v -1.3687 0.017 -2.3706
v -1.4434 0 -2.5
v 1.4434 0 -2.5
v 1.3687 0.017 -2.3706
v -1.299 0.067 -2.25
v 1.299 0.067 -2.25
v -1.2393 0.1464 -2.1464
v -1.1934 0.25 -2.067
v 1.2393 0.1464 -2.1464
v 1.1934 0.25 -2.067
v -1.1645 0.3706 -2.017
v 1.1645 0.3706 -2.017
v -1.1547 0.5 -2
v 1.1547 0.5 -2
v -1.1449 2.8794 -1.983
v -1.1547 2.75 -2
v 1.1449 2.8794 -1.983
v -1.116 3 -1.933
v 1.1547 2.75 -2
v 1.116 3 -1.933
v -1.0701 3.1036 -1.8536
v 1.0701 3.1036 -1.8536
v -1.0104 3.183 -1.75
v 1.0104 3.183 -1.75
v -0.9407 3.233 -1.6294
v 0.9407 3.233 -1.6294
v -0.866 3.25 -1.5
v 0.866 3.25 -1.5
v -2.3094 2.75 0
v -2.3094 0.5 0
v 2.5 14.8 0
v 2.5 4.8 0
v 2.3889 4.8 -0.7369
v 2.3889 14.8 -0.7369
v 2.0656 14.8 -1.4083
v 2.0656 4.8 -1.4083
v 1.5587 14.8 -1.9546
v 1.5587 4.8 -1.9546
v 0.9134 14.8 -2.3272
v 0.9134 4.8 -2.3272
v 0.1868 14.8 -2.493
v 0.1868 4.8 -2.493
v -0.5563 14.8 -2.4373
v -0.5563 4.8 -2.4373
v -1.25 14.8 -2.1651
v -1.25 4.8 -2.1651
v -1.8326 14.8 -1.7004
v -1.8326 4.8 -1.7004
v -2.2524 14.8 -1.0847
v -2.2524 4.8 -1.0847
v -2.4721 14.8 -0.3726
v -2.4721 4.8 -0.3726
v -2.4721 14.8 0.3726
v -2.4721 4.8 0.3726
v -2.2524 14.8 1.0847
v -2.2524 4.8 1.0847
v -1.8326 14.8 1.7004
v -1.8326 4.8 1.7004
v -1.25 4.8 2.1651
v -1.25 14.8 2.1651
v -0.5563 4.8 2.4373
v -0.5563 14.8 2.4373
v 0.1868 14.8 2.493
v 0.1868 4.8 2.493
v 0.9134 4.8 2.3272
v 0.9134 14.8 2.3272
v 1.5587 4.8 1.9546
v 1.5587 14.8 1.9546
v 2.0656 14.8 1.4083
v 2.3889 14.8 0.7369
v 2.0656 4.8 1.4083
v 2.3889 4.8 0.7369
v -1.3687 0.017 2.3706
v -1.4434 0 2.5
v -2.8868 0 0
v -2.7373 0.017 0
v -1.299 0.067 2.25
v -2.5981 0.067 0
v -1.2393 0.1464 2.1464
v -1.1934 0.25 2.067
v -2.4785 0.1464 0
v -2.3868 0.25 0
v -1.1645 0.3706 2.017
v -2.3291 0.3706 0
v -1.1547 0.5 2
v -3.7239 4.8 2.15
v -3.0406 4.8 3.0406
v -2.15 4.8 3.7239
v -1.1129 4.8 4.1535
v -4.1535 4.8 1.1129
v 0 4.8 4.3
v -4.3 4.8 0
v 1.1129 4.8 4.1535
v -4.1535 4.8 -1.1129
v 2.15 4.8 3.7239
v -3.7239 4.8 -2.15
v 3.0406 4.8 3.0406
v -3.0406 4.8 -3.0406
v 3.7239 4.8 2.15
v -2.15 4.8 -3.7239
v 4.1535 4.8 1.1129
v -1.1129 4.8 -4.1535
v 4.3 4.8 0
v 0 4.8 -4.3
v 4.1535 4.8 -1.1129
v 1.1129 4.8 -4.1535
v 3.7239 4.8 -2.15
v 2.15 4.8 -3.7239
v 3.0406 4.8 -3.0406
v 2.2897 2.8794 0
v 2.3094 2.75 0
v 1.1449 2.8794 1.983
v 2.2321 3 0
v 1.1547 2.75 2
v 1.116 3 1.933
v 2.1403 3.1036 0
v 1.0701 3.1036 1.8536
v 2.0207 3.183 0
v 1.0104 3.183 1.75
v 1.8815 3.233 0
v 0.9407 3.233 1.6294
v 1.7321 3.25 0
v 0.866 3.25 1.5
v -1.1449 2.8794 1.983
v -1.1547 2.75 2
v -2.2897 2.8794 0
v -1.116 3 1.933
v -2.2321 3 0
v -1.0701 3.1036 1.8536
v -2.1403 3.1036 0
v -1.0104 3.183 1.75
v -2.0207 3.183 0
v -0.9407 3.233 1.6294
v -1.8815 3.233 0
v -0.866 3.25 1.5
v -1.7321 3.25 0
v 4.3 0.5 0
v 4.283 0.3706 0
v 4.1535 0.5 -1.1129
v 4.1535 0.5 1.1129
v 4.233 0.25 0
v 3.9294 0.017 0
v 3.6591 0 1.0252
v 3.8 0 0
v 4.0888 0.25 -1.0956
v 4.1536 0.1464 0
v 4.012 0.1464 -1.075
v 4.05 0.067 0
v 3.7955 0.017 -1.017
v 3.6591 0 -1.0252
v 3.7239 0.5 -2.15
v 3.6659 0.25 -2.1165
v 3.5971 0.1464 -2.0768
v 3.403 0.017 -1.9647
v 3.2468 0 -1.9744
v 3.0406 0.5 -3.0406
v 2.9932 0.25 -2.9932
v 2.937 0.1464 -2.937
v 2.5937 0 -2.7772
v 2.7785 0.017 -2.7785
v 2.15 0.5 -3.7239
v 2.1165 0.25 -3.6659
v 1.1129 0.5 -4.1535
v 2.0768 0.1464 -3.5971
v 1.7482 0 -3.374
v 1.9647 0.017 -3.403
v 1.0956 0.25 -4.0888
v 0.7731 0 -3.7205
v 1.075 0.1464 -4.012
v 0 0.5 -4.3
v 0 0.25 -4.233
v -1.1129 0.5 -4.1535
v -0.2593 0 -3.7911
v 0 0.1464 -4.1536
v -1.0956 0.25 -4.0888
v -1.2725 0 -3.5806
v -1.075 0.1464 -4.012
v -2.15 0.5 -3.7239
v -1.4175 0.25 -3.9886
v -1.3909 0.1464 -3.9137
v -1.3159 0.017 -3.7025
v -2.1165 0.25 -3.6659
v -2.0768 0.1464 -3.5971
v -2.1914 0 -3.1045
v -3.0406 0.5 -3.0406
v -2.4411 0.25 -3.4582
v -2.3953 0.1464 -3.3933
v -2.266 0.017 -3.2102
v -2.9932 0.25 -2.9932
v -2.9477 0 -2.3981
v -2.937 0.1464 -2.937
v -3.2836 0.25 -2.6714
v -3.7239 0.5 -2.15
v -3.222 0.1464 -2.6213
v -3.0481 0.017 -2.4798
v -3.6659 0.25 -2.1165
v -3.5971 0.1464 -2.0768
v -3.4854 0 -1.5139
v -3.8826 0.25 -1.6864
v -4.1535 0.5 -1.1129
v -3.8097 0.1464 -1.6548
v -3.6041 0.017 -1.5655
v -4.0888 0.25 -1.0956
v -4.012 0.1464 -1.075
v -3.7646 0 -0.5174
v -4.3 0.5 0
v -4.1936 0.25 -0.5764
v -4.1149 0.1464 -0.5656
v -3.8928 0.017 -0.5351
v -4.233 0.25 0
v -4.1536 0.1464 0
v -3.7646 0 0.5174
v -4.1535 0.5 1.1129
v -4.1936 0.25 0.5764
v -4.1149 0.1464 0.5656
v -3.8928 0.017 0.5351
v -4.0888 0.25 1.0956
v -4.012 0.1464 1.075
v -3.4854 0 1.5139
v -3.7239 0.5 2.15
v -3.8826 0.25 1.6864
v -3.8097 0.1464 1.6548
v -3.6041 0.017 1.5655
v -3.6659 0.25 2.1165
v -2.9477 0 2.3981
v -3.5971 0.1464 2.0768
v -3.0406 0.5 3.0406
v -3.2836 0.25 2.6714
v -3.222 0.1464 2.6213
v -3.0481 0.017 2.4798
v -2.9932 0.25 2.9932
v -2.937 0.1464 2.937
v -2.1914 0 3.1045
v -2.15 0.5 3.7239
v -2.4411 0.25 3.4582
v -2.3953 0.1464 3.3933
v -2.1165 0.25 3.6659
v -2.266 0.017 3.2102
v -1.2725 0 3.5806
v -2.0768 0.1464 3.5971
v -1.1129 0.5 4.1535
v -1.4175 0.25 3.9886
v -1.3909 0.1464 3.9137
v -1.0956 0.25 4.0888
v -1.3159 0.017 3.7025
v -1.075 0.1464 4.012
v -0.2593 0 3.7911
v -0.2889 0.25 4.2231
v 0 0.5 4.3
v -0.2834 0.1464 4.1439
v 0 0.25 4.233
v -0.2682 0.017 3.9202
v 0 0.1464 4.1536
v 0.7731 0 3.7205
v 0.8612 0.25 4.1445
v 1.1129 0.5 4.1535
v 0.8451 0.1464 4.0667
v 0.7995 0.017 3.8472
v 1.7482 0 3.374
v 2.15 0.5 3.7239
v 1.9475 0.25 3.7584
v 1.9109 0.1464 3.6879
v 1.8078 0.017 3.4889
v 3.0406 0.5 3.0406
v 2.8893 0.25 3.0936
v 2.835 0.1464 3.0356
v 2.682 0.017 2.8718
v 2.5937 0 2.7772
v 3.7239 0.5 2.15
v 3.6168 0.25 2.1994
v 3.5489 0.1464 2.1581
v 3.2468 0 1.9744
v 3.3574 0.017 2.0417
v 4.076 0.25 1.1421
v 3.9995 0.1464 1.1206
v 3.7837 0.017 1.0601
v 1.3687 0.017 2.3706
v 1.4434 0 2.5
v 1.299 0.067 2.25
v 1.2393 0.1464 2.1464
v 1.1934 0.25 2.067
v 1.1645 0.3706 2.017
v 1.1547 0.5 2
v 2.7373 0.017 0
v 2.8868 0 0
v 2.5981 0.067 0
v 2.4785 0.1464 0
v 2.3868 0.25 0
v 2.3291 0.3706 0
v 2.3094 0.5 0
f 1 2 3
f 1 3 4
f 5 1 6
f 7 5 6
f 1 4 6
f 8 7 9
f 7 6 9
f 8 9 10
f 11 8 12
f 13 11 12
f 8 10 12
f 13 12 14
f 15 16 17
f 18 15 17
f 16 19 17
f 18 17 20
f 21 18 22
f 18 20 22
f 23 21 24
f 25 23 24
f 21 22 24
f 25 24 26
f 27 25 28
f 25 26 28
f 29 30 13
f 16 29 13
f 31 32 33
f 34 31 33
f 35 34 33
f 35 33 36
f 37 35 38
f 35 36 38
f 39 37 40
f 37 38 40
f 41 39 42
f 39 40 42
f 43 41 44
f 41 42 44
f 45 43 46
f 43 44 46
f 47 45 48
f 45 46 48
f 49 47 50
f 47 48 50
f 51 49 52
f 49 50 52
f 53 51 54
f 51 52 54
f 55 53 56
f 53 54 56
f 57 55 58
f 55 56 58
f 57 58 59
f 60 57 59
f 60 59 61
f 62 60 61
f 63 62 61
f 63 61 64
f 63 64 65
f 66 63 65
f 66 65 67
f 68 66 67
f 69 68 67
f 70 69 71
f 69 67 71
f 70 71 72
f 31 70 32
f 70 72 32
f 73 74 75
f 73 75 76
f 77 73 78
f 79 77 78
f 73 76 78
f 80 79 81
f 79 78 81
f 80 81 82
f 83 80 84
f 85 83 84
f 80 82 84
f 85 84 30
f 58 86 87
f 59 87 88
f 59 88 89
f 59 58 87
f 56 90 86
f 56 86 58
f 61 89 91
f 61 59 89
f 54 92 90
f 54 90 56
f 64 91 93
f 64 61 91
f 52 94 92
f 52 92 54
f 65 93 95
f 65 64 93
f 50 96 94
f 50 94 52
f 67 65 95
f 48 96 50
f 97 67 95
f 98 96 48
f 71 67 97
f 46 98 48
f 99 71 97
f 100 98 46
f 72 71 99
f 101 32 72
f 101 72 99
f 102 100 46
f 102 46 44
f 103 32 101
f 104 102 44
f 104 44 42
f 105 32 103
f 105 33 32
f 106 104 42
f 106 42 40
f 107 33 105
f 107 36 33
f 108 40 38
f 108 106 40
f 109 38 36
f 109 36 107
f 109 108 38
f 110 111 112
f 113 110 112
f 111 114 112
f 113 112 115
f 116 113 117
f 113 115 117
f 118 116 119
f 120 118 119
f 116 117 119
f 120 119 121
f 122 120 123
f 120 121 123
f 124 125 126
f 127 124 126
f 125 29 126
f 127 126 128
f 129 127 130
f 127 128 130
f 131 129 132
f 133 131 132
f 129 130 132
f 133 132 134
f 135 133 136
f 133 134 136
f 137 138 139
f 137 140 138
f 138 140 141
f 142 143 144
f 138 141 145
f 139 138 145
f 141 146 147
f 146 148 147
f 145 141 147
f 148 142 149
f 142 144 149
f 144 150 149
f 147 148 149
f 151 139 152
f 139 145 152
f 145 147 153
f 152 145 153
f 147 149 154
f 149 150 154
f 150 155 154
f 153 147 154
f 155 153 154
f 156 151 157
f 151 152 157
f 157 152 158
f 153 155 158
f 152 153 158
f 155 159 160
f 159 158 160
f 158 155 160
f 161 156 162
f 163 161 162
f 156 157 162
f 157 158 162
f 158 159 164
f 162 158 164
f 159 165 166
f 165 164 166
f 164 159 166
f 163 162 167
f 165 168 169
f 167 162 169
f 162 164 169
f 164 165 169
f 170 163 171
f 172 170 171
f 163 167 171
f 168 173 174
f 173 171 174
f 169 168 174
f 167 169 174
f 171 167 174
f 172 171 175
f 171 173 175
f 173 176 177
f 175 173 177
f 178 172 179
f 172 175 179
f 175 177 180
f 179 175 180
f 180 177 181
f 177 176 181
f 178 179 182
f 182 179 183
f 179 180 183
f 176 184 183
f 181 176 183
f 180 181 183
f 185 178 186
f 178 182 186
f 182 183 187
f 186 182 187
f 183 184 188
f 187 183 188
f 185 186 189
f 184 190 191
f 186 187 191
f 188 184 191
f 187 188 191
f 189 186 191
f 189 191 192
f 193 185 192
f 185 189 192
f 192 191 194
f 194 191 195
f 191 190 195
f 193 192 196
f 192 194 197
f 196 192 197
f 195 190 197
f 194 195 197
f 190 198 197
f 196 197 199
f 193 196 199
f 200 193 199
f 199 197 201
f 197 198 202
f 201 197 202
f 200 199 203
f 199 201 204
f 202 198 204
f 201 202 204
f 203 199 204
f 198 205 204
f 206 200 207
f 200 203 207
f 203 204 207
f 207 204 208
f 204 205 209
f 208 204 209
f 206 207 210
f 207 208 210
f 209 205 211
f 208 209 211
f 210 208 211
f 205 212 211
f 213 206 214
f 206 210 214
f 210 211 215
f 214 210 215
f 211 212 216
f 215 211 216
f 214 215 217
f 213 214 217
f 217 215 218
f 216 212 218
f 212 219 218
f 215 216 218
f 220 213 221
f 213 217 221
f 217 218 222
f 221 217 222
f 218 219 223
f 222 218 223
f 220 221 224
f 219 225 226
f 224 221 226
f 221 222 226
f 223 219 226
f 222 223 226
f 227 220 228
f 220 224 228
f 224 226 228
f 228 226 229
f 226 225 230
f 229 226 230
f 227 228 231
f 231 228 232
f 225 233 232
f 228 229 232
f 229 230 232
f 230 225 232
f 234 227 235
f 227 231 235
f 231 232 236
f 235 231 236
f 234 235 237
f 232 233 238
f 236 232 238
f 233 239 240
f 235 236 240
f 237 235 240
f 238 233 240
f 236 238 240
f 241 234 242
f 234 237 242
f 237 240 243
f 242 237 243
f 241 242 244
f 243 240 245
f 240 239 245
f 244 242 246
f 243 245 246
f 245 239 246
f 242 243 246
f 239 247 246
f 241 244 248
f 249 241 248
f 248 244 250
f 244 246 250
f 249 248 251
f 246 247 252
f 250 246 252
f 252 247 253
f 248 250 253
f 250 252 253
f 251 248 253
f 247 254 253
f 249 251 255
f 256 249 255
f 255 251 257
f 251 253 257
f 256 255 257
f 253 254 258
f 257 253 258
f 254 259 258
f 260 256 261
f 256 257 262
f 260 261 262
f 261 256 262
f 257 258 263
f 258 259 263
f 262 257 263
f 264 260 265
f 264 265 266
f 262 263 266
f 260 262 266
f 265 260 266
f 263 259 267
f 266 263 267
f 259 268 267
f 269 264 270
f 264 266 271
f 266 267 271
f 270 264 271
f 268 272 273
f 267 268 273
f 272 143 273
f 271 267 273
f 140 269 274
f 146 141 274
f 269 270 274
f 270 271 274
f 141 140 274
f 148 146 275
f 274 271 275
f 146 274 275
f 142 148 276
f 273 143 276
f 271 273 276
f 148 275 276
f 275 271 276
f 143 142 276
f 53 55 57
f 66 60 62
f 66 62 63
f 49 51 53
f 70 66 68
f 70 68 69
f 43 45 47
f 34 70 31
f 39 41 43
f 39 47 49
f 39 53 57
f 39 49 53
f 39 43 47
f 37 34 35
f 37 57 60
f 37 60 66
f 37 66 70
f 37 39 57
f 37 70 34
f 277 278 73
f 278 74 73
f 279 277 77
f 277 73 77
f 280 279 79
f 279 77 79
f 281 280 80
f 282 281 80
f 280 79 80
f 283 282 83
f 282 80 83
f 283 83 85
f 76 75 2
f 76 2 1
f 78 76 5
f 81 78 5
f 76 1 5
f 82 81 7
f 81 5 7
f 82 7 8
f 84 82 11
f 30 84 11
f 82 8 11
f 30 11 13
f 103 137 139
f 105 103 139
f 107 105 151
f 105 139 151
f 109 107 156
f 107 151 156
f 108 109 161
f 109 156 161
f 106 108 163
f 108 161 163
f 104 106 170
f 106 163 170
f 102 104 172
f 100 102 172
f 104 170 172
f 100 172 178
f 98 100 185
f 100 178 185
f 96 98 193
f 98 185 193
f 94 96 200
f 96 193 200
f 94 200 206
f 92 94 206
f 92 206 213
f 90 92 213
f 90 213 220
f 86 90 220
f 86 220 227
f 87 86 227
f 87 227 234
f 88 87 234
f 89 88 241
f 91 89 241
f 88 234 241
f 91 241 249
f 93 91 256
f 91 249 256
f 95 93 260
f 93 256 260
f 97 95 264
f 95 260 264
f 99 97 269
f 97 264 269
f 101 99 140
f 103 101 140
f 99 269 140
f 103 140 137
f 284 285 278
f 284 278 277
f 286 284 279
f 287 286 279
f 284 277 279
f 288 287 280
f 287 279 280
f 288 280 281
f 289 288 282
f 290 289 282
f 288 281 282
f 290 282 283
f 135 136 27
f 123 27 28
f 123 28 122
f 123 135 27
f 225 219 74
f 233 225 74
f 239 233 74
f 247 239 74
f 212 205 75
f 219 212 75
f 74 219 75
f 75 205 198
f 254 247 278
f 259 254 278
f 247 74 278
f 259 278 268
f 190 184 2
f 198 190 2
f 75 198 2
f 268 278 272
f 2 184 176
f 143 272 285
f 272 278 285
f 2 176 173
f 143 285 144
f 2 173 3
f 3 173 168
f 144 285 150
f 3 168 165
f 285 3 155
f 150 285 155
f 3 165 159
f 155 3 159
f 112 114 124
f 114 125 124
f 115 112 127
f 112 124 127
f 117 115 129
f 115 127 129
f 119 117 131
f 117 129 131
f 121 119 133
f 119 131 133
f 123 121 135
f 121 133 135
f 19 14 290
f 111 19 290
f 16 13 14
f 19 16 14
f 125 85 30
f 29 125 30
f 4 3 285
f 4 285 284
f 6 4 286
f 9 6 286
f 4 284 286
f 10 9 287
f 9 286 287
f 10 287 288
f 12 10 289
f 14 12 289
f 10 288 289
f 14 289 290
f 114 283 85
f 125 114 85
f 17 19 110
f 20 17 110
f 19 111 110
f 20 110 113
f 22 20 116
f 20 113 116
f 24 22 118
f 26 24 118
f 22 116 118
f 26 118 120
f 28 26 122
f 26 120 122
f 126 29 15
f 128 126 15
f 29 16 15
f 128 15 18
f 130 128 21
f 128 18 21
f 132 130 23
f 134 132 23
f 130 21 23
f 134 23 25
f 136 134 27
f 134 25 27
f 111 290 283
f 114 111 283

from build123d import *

# Parameters (mm, degrees)
SKETCH2_R           = 4.3
BOSS_EXTRUDE1_DEPTH = 4.8
SKETCH3_R           = 2.5
BOSS_EXTRUDE2_DEPTH = 10
CUT_EXTRUDE1_DEPTH  = 3.25
FILLET1_R           = 0.5


with BuildPart() as part:
    # Sketch2 → Boss-Extrude1 (new body)
    with BuildSketch(Plane(origin=(0, 0, 0), x_dir=(1, 0, 0), z_dir=(0, 1, 0))):
        Circle(SKETCH2_R)
    extrude(amount=BOSS_EXTRUDE1_DEPTH)

    # Sketch3 → Boss-Extrude2 (add)
    with BuildSketch(Plane(origin=(0, 4.8, 0), x_dir=(1, 0, 0), z_dir=(0, 1, 0))):
        Circle(SKETCH3_R)
    extrude(amount=BOSS_EXTRUDE2_DEPTH)

    # Sketch5 → Cut-Extrude1 (cut)
    with BuildSketch(Plane.XZ):
        Polygon((-1.154700538, 2), (-2.309401077, 0), (-1.154700538, -2), (1.154700538, -2), (2.309401077, 0), (1.154700538, 2), align=None)
    extrude(amount=-CUT_EXTRUDE1_DEPTH, mode=Mode.SUBTRACT)

    # Fillet1
    fillet1_edges = [part.edges().sort_by_distance(p)[0] for p in [
        (0, 3.25, 2),
        (1.732050808, 3.25, 1),
        (1.732050808, 3.25, -1),
        (0, 3.25, -2),
        (-1.732050808, 3.25, -1),
        (-1.732050808, 3.25, 1),
        (0, 0, 2),
        (-1.732050808, 0, 1),
        (-1.732050808, 0, -1),
        (0, 0, -2),
        (1.732050808, 0, -1),
        (1.732050808, 0, 1),
        (-4.3, 0, 0),
    ]]
    fillet(fillet1_edges, radius=FILLET1_R)


solid = part.part
